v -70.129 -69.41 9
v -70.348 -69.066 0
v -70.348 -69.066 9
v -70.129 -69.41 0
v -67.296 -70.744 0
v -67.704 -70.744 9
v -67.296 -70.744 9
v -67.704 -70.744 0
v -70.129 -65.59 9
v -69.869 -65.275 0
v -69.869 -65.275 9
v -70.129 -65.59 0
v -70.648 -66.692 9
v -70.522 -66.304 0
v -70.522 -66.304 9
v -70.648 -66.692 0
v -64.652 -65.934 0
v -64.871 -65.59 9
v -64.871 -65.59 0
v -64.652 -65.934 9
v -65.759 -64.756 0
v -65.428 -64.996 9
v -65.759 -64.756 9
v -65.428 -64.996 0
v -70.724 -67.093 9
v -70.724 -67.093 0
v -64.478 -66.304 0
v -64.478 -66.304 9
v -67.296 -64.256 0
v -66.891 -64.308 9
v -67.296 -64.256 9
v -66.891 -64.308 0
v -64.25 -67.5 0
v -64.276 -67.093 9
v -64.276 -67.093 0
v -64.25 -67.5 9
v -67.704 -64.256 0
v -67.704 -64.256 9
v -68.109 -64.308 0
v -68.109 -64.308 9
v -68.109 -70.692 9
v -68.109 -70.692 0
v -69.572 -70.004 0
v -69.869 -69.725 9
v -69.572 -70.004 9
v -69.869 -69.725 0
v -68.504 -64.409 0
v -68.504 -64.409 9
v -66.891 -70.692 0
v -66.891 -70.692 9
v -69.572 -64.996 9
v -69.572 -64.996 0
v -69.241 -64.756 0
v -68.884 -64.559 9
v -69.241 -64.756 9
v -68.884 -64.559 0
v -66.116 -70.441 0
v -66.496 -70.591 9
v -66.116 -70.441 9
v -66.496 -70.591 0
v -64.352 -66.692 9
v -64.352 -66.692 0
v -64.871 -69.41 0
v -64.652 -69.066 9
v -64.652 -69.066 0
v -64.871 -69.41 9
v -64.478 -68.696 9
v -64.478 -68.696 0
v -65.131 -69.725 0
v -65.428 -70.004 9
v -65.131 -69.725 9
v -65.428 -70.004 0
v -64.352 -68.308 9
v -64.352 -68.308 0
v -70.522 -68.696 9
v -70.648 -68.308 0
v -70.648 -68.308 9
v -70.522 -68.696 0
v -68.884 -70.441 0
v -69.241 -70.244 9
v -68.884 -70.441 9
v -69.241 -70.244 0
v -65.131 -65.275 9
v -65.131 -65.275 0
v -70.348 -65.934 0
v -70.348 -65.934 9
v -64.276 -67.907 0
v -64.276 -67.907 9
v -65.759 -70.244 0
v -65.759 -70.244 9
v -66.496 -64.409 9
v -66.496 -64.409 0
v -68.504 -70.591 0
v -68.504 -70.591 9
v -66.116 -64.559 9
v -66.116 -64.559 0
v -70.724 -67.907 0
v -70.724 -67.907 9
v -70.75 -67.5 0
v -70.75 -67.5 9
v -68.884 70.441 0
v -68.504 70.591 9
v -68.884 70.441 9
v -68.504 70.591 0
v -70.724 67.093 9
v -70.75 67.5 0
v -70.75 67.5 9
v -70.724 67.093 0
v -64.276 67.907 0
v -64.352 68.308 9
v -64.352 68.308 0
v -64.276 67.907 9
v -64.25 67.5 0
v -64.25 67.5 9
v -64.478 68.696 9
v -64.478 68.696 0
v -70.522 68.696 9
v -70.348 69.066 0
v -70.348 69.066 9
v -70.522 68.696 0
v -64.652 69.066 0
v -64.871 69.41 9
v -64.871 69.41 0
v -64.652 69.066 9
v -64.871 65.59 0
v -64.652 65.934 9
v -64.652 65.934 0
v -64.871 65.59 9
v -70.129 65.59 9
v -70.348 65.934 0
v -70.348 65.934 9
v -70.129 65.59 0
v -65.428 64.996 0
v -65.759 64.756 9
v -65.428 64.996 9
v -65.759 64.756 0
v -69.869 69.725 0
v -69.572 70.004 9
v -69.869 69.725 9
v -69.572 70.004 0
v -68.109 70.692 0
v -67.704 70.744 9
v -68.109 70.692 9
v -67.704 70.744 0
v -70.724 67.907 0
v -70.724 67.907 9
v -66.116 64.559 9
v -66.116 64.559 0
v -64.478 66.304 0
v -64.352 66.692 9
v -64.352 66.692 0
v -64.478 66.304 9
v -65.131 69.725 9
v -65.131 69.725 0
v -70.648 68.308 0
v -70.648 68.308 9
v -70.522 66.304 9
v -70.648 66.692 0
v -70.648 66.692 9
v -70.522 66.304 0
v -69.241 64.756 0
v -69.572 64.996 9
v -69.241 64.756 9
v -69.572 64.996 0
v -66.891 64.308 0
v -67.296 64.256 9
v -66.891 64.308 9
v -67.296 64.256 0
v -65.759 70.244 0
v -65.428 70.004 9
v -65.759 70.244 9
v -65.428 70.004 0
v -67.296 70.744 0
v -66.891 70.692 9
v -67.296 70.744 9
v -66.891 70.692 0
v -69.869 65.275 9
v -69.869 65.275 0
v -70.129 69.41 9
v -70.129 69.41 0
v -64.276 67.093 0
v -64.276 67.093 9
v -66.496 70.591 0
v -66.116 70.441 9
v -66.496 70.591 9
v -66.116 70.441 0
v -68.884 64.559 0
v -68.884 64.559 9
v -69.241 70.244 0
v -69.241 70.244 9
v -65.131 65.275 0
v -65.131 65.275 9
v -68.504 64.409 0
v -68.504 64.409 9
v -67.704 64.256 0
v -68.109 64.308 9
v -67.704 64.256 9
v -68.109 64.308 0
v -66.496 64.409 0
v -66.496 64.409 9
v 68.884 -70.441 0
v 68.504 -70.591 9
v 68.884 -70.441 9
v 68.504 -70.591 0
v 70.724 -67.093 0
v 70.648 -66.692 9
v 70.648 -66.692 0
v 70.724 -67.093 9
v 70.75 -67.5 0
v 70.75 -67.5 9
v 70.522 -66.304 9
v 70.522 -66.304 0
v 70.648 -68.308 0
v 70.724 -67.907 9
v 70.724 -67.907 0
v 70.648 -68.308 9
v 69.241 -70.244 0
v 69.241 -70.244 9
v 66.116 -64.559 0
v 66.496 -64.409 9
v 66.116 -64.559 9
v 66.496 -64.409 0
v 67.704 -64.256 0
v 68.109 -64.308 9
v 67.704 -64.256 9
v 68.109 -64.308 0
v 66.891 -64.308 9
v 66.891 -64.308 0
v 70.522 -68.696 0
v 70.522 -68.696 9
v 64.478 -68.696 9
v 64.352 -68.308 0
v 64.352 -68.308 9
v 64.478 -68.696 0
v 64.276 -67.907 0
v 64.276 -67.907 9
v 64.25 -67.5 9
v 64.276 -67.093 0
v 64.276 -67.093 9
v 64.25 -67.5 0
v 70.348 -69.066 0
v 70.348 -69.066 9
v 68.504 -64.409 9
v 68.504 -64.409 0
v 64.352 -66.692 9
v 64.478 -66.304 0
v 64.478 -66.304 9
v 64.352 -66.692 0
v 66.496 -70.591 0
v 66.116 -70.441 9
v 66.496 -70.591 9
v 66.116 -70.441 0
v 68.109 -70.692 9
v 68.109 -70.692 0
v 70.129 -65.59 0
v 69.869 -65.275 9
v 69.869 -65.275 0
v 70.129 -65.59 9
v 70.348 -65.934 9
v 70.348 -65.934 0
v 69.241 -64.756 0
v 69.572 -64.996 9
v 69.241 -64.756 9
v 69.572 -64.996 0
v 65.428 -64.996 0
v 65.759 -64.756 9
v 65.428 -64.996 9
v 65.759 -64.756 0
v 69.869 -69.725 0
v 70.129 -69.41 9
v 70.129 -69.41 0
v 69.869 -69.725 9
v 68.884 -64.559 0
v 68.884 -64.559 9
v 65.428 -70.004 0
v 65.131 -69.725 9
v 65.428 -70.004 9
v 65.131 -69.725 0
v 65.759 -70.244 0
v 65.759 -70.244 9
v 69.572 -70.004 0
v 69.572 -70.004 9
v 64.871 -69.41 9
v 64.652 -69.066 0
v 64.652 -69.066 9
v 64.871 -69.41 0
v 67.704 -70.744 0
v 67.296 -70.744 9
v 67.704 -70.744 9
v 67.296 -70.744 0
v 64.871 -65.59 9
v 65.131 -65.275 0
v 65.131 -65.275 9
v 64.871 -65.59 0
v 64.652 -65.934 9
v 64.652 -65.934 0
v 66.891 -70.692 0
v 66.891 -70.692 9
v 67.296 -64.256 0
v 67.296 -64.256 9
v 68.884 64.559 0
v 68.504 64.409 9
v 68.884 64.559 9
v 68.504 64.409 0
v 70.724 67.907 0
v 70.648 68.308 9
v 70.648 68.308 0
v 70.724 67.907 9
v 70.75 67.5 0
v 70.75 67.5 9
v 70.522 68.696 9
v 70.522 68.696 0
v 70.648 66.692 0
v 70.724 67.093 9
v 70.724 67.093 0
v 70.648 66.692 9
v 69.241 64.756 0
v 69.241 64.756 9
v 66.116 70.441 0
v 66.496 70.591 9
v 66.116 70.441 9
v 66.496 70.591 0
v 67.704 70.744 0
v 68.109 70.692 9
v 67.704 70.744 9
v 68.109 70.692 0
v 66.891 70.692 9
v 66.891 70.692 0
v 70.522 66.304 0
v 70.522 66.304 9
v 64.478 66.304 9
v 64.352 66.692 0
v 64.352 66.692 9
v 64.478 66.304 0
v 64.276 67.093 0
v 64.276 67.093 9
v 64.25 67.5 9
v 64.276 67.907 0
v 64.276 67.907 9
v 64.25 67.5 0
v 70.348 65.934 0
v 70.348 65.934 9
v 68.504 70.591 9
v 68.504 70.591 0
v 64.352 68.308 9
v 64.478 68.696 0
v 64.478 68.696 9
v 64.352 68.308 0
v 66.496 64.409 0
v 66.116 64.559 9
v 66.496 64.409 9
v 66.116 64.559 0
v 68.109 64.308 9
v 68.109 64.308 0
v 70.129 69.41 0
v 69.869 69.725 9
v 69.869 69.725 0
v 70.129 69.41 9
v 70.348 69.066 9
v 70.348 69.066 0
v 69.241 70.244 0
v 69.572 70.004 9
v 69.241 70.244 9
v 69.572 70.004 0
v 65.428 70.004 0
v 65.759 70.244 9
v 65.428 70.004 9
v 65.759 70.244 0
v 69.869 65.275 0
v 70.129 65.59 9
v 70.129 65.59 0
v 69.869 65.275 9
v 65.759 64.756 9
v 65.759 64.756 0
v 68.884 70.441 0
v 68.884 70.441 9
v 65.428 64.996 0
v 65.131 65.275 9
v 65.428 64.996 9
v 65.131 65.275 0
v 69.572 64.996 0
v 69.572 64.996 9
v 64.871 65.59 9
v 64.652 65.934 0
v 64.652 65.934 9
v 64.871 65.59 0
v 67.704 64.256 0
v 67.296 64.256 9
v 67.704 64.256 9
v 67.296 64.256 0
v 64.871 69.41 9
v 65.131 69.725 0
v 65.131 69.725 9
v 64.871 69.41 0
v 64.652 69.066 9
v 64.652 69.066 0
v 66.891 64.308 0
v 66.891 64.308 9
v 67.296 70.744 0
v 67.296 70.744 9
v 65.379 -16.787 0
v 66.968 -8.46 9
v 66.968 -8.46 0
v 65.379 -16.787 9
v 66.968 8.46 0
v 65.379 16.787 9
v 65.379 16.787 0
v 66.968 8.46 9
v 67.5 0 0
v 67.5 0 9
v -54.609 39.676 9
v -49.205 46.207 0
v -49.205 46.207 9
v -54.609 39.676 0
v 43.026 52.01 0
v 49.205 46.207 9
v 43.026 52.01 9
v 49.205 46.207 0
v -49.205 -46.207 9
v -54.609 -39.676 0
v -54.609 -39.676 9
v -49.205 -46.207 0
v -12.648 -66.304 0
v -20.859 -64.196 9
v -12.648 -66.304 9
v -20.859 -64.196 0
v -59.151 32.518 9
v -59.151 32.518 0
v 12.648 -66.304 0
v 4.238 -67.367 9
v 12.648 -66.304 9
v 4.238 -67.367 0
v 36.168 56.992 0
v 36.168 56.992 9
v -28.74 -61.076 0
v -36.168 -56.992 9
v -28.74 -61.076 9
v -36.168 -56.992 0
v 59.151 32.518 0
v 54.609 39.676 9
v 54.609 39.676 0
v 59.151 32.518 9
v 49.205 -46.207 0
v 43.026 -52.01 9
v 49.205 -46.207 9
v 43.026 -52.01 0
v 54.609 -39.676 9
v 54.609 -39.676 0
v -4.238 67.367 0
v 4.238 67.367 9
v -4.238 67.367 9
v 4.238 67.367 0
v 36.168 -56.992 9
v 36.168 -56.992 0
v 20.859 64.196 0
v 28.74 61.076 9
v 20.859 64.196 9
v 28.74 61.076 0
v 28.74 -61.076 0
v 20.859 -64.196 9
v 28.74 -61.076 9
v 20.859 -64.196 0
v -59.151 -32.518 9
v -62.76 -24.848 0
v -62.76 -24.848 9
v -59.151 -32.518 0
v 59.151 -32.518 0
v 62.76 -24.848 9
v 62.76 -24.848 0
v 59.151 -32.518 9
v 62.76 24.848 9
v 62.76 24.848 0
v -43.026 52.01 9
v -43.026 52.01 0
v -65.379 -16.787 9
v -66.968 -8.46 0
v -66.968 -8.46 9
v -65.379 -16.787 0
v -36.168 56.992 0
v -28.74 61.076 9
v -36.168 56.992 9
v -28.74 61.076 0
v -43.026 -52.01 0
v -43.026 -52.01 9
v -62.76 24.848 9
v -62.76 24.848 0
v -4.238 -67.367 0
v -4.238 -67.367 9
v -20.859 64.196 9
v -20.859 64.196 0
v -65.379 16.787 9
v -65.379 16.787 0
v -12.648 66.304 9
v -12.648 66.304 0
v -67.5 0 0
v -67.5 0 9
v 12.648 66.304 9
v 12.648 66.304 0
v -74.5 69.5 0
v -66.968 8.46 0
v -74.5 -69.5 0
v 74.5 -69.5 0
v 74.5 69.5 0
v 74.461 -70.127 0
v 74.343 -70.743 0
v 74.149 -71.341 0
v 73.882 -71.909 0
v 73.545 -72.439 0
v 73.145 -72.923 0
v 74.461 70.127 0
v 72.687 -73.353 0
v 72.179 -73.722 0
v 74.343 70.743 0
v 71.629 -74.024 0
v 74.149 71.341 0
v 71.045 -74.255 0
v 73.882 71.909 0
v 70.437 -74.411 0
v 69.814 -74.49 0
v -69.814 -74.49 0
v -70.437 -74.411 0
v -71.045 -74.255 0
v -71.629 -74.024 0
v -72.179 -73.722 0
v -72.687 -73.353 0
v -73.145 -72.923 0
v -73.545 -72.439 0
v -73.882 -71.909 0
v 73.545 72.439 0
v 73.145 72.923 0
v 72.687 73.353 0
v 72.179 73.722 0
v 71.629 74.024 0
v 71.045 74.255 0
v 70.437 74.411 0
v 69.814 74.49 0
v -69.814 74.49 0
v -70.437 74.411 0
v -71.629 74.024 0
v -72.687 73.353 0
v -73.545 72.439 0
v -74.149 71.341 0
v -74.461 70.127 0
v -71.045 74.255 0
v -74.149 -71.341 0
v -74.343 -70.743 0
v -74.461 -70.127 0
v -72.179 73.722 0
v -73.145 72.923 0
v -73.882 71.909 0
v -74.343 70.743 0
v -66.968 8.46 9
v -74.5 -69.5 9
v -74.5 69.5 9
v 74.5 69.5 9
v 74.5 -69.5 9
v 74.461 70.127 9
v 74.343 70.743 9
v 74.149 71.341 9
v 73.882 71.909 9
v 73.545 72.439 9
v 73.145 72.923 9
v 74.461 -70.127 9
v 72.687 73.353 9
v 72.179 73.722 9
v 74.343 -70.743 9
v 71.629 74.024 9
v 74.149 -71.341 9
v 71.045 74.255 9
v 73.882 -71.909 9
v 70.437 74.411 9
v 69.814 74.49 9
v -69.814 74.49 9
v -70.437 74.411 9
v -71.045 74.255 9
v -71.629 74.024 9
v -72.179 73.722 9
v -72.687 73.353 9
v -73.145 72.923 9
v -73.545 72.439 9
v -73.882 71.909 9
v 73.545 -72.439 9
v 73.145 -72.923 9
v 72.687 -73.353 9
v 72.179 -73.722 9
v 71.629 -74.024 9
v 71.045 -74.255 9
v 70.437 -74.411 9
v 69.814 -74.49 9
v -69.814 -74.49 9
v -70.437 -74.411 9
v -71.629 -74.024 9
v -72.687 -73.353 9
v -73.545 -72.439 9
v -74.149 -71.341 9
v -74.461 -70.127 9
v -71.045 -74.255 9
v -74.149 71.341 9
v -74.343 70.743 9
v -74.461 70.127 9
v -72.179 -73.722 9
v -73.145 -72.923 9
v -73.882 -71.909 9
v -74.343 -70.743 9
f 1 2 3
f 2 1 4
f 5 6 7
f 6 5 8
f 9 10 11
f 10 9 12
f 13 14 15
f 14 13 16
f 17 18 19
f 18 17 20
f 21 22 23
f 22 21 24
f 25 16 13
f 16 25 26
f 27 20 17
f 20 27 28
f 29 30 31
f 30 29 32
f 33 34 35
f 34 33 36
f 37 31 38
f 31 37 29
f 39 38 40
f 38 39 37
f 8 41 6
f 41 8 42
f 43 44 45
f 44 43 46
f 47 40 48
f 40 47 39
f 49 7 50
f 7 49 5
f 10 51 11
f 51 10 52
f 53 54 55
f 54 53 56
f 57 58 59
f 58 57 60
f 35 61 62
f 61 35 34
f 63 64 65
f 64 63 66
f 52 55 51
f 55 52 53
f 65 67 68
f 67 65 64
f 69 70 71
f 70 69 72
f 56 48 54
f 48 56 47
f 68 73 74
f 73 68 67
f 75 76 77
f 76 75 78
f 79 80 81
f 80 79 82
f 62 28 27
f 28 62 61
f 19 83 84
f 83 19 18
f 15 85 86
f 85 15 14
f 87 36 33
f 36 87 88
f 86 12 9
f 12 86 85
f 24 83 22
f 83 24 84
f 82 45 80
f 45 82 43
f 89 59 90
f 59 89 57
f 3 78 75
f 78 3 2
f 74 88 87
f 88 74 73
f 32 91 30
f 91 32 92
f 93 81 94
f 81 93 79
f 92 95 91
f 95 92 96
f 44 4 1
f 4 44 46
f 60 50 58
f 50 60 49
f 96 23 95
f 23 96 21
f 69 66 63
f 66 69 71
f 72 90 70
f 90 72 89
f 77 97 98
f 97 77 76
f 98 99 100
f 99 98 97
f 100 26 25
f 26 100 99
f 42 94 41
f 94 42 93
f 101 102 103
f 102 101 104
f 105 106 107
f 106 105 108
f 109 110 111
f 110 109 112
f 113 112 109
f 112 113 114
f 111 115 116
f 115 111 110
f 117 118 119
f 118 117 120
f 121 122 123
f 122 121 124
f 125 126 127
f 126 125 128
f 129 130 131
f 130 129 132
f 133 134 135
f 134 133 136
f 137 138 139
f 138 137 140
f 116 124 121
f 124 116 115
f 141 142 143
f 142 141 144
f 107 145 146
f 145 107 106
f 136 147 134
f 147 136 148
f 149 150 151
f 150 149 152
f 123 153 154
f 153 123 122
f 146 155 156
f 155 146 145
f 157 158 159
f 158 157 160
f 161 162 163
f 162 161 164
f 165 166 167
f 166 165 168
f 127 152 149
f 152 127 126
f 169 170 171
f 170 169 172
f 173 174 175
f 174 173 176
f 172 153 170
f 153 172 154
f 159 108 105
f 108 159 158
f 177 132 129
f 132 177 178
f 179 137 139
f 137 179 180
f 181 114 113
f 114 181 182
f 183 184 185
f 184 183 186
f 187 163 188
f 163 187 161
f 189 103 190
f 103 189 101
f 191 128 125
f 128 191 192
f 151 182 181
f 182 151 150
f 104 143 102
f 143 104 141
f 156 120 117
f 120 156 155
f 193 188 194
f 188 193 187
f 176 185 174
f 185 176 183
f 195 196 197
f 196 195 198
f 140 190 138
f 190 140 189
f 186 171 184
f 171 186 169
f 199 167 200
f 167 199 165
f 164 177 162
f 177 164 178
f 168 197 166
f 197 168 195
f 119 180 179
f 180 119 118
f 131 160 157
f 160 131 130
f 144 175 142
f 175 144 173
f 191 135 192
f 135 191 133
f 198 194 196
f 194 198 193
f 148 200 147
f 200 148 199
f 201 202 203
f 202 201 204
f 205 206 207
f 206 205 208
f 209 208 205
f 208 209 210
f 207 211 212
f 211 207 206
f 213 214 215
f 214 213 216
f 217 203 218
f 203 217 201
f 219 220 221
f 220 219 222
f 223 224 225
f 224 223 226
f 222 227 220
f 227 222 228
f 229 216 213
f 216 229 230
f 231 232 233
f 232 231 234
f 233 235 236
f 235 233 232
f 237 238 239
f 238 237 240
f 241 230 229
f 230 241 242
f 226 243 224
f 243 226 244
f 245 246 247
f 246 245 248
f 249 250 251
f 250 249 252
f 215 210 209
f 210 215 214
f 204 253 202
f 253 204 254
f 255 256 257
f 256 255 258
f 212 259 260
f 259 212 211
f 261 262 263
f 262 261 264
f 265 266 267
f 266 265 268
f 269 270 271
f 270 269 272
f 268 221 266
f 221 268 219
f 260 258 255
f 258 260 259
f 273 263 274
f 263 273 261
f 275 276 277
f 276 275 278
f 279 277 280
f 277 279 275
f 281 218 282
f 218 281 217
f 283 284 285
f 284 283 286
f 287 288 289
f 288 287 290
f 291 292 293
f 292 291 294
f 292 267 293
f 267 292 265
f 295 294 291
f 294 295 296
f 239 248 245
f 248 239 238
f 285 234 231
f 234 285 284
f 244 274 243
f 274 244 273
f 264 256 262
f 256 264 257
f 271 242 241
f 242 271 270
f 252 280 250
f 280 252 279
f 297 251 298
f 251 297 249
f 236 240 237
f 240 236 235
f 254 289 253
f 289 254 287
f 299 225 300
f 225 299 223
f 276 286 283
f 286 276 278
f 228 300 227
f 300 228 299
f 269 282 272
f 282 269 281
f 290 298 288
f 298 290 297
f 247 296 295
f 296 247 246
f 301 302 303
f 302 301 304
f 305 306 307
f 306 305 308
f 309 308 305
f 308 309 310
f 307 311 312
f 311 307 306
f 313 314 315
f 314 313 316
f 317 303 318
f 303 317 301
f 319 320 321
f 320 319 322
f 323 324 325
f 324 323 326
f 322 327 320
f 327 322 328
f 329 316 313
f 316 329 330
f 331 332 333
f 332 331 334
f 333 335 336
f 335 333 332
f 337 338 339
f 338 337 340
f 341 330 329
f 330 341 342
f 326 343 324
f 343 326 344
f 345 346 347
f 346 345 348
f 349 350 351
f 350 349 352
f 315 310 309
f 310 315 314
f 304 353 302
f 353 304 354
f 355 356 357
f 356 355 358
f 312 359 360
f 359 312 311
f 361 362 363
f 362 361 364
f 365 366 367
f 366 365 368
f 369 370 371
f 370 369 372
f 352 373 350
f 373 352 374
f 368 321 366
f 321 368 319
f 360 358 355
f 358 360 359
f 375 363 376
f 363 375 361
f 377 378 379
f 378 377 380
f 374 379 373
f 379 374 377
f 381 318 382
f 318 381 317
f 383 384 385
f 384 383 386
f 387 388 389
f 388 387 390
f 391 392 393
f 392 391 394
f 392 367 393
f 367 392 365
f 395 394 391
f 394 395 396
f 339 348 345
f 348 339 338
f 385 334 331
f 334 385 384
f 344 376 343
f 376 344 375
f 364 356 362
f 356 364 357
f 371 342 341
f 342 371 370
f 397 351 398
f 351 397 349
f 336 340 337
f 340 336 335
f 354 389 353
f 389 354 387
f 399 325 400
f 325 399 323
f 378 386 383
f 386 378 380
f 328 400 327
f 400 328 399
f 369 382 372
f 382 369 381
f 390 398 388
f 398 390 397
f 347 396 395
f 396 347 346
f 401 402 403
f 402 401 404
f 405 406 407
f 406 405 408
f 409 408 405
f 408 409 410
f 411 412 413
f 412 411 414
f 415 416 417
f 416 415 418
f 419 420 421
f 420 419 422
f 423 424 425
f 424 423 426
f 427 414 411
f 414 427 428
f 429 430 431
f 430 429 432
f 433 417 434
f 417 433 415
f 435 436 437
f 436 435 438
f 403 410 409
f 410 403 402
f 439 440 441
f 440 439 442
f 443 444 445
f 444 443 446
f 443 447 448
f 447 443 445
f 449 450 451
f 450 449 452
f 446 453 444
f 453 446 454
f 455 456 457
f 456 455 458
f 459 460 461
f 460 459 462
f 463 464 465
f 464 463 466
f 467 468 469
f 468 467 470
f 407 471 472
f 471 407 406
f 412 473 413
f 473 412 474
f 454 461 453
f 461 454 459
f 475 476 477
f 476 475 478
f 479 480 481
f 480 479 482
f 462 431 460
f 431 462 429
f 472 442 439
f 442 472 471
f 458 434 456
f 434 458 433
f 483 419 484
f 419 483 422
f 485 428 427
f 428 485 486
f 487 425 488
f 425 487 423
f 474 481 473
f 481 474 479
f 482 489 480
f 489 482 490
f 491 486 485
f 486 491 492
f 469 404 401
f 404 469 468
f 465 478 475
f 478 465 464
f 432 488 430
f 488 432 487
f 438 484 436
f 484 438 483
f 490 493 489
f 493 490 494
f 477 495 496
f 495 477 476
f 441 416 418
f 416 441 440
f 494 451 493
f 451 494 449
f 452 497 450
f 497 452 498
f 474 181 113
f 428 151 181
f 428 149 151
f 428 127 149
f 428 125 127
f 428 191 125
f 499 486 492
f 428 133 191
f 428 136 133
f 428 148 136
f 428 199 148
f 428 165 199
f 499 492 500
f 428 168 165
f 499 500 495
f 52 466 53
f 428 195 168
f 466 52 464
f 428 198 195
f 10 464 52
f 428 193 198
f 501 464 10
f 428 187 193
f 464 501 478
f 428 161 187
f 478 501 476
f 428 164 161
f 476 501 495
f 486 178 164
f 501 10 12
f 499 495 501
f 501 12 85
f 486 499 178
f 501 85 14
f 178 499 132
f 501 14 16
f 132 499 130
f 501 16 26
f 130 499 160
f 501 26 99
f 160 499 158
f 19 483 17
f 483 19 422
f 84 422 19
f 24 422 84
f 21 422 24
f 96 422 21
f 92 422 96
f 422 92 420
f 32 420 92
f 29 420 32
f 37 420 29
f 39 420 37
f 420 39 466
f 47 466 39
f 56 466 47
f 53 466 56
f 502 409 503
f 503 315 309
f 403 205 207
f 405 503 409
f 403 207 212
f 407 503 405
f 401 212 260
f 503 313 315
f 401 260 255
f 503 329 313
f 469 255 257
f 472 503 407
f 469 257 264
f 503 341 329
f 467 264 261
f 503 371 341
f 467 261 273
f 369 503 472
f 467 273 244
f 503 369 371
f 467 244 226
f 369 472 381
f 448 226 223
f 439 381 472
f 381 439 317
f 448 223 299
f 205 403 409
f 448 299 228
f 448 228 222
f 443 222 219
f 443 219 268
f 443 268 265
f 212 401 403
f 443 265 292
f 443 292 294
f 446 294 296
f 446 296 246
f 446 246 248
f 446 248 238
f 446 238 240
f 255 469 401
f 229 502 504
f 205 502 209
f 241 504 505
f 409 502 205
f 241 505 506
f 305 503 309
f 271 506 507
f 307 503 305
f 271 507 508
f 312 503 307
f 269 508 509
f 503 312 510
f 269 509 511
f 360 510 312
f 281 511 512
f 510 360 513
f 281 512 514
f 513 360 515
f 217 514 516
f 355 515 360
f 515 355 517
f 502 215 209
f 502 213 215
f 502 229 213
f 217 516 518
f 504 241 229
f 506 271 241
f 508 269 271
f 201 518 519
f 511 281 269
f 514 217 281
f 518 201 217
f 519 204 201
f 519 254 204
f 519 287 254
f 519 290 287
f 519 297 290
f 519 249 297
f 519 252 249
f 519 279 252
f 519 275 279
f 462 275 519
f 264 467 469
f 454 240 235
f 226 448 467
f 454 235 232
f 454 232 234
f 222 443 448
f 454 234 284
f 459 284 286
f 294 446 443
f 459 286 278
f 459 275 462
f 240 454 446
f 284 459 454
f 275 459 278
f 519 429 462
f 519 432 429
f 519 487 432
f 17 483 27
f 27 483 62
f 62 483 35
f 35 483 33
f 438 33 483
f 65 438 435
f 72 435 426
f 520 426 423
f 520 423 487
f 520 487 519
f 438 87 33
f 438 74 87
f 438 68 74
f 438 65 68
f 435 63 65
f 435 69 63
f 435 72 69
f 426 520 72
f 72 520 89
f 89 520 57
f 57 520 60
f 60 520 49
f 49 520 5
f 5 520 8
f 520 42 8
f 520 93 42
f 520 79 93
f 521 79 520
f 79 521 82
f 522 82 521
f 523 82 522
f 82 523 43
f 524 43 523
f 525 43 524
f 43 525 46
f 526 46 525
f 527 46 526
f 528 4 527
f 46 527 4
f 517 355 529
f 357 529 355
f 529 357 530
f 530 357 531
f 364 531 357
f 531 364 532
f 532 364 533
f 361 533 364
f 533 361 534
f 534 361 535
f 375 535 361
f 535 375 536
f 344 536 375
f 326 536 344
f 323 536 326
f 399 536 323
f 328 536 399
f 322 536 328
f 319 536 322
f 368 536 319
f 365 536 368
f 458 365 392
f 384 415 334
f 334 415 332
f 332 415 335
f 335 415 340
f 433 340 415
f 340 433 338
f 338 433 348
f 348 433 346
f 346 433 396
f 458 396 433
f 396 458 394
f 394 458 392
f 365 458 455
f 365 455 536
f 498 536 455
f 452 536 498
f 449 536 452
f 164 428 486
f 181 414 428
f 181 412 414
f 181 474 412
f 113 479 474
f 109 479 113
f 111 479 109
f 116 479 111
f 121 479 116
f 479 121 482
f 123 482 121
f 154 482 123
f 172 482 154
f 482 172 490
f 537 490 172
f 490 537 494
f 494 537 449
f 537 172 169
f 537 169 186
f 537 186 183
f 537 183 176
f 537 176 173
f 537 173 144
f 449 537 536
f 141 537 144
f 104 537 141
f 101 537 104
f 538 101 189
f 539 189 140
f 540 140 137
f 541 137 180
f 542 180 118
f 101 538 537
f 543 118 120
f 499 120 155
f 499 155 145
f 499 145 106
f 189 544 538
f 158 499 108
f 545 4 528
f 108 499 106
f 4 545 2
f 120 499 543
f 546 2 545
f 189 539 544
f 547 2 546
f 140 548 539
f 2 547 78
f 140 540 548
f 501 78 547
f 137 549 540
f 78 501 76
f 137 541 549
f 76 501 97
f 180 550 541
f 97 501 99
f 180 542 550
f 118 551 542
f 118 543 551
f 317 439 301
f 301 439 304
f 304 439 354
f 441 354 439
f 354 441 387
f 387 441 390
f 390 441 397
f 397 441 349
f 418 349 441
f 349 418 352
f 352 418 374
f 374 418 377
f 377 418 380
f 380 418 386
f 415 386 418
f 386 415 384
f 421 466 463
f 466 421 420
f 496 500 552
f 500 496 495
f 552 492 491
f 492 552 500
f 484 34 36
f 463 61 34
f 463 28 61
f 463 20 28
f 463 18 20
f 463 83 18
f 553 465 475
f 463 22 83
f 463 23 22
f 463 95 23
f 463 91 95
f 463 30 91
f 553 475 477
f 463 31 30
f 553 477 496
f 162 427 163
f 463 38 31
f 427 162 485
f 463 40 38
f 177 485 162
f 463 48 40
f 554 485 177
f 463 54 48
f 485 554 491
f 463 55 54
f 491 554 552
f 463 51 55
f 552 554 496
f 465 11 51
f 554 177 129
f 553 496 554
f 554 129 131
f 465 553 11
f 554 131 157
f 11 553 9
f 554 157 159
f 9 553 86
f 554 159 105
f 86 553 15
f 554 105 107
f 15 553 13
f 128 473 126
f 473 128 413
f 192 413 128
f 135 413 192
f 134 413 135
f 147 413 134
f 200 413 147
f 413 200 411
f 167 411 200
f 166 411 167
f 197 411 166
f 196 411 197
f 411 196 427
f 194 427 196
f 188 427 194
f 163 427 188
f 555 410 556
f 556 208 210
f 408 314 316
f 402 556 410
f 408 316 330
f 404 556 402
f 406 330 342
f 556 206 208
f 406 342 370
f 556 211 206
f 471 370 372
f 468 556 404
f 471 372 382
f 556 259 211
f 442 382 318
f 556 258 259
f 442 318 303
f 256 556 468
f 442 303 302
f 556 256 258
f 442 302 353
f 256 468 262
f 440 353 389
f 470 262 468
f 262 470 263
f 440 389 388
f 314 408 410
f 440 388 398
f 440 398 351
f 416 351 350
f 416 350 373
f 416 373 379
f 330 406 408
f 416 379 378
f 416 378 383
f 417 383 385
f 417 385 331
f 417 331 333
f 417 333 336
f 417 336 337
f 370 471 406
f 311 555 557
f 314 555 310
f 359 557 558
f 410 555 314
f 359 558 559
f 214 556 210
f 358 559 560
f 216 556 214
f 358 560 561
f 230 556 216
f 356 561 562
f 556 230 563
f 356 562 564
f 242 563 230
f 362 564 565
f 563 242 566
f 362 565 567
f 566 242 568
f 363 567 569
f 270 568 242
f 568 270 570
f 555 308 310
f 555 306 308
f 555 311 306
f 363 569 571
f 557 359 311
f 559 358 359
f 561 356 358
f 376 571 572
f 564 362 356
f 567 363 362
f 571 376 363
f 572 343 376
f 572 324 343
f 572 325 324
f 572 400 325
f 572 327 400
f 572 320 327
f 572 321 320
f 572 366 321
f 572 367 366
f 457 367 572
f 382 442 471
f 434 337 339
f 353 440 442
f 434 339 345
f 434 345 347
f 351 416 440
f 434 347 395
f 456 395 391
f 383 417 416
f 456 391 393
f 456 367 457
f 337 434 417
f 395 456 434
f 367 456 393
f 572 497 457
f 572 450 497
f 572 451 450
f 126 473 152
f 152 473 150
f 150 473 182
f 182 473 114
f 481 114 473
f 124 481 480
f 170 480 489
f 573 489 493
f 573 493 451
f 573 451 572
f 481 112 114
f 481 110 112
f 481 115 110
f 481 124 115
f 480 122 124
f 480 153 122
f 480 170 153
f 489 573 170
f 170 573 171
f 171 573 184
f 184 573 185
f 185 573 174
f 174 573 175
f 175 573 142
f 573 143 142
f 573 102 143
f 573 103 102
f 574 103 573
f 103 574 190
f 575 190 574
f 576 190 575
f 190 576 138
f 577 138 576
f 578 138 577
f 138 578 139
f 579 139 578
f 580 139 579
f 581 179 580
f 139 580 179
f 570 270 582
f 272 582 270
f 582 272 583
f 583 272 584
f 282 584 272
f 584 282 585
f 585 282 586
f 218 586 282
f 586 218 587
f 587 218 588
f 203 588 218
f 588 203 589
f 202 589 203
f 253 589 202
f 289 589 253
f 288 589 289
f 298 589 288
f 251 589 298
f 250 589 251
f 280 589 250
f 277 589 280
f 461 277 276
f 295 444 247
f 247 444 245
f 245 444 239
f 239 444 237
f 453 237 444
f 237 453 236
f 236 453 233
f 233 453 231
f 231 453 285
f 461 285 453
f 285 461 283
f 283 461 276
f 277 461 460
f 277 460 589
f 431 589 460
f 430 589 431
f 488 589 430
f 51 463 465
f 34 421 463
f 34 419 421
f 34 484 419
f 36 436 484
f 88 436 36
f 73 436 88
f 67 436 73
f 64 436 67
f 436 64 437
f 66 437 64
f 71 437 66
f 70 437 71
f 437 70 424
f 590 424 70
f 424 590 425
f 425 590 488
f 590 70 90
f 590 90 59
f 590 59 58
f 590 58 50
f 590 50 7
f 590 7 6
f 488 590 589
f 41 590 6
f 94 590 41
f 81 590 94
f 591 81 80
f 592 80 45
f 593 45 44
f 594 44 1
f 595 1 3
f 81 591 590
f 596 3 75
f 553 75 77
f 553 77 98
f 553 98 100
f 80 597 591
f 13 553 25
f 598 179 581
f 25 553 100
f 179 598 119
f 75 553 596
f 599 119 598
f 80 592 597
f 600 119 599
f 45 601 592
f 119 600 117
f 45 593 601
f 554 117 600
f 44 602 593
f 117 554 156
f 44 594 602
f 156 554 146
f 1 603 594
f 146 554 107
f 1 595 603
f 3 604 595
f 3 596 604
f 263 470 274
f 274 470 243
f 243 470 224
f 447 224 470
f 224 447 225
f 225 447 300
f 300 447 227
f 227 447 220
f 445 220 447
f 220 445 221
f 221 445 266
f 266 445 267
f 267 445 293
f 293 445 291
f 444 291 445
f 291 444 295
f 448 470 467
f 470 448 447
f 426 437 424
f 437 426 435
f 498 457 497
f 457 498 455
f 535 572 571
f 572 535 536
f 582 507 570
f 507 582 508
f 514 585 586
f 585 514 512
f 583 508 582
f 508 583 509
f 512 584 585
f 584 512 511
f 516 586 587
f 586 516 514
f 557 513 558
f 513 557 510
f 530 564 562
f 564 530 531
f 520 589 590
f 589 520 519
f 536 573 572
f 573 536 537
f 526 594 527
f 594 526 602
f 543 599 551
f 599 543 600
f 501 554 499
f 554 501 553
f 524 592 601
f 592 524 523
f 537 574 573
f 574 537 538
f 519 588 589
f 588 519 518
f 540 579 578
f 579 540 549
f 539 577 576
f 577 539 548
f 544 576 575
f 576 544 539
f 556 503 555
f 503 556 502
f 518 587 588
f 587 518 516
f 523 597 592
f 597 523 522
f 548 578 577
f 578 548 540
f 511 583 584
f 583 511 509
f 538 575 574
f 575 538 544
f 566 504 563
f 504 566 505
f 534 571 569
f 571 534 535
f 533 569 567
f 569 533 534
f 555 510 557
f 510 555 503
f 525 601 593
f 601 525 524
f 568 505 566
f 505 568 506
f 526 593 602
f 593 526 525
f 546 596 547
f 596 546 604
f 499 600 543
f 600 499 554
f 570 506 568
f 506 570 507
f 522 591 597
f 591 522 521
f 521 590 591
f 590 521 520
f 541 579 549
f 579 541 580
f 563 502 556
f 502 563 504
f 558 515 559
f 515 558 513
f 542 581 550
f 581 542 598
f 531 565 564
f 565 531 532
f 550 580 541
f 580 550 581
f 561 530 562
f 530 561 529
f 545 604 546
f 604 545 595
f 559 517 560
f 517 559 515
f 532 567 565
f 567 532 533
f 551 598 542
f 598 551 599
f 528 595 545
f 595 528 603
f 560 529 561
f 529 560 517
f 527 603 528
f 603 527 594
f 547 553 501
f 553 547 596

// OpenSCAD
$fn = 50;


difference() {
	union() {
		hull() {
			translate(v = [-69.5000000000, 69.5000000000, 0]) {
				cylinder(h = 9, r = 5);
			}
			translate(v = [69.5000000000, 69.5000000000, 0]) {
				cylinder(h = 9, r = 5);
			}
			translate(v = [-69.5000000000, -69.5000000000, 0]) {
				cylinder(h = 9, r = 5);
			}
			translate(v = [69.5000000000, -69.5000000000, 0]) {
				cylinder(h = 9, r = 5);
			}
		}
	}
	union() {
		#translate(v = [-67.5000000000, -67.5000000000, -100.0000000000]) {
			cylinder(h = 200, r = 3.2500000000);
		}
		#translate(v = [-67.5000000000, 67.5000000000, -100.0000000000]) {
			cylinder(h = 200, r = 3.2500000000);
		}
		#translate(v = [67.5000000000, -67.5000000000, -100.0000000000]) {
			cylinder(h = 200, r = 3.2500000000);
		}
		#translate(v = [67.5000000000, 67.5000000000, -100.0000000000]) {
			cylinder(h = 200, r = 3.2500000000);
		}
		#cylinder(h = 9, r = 67.5000000000);
	}
}
